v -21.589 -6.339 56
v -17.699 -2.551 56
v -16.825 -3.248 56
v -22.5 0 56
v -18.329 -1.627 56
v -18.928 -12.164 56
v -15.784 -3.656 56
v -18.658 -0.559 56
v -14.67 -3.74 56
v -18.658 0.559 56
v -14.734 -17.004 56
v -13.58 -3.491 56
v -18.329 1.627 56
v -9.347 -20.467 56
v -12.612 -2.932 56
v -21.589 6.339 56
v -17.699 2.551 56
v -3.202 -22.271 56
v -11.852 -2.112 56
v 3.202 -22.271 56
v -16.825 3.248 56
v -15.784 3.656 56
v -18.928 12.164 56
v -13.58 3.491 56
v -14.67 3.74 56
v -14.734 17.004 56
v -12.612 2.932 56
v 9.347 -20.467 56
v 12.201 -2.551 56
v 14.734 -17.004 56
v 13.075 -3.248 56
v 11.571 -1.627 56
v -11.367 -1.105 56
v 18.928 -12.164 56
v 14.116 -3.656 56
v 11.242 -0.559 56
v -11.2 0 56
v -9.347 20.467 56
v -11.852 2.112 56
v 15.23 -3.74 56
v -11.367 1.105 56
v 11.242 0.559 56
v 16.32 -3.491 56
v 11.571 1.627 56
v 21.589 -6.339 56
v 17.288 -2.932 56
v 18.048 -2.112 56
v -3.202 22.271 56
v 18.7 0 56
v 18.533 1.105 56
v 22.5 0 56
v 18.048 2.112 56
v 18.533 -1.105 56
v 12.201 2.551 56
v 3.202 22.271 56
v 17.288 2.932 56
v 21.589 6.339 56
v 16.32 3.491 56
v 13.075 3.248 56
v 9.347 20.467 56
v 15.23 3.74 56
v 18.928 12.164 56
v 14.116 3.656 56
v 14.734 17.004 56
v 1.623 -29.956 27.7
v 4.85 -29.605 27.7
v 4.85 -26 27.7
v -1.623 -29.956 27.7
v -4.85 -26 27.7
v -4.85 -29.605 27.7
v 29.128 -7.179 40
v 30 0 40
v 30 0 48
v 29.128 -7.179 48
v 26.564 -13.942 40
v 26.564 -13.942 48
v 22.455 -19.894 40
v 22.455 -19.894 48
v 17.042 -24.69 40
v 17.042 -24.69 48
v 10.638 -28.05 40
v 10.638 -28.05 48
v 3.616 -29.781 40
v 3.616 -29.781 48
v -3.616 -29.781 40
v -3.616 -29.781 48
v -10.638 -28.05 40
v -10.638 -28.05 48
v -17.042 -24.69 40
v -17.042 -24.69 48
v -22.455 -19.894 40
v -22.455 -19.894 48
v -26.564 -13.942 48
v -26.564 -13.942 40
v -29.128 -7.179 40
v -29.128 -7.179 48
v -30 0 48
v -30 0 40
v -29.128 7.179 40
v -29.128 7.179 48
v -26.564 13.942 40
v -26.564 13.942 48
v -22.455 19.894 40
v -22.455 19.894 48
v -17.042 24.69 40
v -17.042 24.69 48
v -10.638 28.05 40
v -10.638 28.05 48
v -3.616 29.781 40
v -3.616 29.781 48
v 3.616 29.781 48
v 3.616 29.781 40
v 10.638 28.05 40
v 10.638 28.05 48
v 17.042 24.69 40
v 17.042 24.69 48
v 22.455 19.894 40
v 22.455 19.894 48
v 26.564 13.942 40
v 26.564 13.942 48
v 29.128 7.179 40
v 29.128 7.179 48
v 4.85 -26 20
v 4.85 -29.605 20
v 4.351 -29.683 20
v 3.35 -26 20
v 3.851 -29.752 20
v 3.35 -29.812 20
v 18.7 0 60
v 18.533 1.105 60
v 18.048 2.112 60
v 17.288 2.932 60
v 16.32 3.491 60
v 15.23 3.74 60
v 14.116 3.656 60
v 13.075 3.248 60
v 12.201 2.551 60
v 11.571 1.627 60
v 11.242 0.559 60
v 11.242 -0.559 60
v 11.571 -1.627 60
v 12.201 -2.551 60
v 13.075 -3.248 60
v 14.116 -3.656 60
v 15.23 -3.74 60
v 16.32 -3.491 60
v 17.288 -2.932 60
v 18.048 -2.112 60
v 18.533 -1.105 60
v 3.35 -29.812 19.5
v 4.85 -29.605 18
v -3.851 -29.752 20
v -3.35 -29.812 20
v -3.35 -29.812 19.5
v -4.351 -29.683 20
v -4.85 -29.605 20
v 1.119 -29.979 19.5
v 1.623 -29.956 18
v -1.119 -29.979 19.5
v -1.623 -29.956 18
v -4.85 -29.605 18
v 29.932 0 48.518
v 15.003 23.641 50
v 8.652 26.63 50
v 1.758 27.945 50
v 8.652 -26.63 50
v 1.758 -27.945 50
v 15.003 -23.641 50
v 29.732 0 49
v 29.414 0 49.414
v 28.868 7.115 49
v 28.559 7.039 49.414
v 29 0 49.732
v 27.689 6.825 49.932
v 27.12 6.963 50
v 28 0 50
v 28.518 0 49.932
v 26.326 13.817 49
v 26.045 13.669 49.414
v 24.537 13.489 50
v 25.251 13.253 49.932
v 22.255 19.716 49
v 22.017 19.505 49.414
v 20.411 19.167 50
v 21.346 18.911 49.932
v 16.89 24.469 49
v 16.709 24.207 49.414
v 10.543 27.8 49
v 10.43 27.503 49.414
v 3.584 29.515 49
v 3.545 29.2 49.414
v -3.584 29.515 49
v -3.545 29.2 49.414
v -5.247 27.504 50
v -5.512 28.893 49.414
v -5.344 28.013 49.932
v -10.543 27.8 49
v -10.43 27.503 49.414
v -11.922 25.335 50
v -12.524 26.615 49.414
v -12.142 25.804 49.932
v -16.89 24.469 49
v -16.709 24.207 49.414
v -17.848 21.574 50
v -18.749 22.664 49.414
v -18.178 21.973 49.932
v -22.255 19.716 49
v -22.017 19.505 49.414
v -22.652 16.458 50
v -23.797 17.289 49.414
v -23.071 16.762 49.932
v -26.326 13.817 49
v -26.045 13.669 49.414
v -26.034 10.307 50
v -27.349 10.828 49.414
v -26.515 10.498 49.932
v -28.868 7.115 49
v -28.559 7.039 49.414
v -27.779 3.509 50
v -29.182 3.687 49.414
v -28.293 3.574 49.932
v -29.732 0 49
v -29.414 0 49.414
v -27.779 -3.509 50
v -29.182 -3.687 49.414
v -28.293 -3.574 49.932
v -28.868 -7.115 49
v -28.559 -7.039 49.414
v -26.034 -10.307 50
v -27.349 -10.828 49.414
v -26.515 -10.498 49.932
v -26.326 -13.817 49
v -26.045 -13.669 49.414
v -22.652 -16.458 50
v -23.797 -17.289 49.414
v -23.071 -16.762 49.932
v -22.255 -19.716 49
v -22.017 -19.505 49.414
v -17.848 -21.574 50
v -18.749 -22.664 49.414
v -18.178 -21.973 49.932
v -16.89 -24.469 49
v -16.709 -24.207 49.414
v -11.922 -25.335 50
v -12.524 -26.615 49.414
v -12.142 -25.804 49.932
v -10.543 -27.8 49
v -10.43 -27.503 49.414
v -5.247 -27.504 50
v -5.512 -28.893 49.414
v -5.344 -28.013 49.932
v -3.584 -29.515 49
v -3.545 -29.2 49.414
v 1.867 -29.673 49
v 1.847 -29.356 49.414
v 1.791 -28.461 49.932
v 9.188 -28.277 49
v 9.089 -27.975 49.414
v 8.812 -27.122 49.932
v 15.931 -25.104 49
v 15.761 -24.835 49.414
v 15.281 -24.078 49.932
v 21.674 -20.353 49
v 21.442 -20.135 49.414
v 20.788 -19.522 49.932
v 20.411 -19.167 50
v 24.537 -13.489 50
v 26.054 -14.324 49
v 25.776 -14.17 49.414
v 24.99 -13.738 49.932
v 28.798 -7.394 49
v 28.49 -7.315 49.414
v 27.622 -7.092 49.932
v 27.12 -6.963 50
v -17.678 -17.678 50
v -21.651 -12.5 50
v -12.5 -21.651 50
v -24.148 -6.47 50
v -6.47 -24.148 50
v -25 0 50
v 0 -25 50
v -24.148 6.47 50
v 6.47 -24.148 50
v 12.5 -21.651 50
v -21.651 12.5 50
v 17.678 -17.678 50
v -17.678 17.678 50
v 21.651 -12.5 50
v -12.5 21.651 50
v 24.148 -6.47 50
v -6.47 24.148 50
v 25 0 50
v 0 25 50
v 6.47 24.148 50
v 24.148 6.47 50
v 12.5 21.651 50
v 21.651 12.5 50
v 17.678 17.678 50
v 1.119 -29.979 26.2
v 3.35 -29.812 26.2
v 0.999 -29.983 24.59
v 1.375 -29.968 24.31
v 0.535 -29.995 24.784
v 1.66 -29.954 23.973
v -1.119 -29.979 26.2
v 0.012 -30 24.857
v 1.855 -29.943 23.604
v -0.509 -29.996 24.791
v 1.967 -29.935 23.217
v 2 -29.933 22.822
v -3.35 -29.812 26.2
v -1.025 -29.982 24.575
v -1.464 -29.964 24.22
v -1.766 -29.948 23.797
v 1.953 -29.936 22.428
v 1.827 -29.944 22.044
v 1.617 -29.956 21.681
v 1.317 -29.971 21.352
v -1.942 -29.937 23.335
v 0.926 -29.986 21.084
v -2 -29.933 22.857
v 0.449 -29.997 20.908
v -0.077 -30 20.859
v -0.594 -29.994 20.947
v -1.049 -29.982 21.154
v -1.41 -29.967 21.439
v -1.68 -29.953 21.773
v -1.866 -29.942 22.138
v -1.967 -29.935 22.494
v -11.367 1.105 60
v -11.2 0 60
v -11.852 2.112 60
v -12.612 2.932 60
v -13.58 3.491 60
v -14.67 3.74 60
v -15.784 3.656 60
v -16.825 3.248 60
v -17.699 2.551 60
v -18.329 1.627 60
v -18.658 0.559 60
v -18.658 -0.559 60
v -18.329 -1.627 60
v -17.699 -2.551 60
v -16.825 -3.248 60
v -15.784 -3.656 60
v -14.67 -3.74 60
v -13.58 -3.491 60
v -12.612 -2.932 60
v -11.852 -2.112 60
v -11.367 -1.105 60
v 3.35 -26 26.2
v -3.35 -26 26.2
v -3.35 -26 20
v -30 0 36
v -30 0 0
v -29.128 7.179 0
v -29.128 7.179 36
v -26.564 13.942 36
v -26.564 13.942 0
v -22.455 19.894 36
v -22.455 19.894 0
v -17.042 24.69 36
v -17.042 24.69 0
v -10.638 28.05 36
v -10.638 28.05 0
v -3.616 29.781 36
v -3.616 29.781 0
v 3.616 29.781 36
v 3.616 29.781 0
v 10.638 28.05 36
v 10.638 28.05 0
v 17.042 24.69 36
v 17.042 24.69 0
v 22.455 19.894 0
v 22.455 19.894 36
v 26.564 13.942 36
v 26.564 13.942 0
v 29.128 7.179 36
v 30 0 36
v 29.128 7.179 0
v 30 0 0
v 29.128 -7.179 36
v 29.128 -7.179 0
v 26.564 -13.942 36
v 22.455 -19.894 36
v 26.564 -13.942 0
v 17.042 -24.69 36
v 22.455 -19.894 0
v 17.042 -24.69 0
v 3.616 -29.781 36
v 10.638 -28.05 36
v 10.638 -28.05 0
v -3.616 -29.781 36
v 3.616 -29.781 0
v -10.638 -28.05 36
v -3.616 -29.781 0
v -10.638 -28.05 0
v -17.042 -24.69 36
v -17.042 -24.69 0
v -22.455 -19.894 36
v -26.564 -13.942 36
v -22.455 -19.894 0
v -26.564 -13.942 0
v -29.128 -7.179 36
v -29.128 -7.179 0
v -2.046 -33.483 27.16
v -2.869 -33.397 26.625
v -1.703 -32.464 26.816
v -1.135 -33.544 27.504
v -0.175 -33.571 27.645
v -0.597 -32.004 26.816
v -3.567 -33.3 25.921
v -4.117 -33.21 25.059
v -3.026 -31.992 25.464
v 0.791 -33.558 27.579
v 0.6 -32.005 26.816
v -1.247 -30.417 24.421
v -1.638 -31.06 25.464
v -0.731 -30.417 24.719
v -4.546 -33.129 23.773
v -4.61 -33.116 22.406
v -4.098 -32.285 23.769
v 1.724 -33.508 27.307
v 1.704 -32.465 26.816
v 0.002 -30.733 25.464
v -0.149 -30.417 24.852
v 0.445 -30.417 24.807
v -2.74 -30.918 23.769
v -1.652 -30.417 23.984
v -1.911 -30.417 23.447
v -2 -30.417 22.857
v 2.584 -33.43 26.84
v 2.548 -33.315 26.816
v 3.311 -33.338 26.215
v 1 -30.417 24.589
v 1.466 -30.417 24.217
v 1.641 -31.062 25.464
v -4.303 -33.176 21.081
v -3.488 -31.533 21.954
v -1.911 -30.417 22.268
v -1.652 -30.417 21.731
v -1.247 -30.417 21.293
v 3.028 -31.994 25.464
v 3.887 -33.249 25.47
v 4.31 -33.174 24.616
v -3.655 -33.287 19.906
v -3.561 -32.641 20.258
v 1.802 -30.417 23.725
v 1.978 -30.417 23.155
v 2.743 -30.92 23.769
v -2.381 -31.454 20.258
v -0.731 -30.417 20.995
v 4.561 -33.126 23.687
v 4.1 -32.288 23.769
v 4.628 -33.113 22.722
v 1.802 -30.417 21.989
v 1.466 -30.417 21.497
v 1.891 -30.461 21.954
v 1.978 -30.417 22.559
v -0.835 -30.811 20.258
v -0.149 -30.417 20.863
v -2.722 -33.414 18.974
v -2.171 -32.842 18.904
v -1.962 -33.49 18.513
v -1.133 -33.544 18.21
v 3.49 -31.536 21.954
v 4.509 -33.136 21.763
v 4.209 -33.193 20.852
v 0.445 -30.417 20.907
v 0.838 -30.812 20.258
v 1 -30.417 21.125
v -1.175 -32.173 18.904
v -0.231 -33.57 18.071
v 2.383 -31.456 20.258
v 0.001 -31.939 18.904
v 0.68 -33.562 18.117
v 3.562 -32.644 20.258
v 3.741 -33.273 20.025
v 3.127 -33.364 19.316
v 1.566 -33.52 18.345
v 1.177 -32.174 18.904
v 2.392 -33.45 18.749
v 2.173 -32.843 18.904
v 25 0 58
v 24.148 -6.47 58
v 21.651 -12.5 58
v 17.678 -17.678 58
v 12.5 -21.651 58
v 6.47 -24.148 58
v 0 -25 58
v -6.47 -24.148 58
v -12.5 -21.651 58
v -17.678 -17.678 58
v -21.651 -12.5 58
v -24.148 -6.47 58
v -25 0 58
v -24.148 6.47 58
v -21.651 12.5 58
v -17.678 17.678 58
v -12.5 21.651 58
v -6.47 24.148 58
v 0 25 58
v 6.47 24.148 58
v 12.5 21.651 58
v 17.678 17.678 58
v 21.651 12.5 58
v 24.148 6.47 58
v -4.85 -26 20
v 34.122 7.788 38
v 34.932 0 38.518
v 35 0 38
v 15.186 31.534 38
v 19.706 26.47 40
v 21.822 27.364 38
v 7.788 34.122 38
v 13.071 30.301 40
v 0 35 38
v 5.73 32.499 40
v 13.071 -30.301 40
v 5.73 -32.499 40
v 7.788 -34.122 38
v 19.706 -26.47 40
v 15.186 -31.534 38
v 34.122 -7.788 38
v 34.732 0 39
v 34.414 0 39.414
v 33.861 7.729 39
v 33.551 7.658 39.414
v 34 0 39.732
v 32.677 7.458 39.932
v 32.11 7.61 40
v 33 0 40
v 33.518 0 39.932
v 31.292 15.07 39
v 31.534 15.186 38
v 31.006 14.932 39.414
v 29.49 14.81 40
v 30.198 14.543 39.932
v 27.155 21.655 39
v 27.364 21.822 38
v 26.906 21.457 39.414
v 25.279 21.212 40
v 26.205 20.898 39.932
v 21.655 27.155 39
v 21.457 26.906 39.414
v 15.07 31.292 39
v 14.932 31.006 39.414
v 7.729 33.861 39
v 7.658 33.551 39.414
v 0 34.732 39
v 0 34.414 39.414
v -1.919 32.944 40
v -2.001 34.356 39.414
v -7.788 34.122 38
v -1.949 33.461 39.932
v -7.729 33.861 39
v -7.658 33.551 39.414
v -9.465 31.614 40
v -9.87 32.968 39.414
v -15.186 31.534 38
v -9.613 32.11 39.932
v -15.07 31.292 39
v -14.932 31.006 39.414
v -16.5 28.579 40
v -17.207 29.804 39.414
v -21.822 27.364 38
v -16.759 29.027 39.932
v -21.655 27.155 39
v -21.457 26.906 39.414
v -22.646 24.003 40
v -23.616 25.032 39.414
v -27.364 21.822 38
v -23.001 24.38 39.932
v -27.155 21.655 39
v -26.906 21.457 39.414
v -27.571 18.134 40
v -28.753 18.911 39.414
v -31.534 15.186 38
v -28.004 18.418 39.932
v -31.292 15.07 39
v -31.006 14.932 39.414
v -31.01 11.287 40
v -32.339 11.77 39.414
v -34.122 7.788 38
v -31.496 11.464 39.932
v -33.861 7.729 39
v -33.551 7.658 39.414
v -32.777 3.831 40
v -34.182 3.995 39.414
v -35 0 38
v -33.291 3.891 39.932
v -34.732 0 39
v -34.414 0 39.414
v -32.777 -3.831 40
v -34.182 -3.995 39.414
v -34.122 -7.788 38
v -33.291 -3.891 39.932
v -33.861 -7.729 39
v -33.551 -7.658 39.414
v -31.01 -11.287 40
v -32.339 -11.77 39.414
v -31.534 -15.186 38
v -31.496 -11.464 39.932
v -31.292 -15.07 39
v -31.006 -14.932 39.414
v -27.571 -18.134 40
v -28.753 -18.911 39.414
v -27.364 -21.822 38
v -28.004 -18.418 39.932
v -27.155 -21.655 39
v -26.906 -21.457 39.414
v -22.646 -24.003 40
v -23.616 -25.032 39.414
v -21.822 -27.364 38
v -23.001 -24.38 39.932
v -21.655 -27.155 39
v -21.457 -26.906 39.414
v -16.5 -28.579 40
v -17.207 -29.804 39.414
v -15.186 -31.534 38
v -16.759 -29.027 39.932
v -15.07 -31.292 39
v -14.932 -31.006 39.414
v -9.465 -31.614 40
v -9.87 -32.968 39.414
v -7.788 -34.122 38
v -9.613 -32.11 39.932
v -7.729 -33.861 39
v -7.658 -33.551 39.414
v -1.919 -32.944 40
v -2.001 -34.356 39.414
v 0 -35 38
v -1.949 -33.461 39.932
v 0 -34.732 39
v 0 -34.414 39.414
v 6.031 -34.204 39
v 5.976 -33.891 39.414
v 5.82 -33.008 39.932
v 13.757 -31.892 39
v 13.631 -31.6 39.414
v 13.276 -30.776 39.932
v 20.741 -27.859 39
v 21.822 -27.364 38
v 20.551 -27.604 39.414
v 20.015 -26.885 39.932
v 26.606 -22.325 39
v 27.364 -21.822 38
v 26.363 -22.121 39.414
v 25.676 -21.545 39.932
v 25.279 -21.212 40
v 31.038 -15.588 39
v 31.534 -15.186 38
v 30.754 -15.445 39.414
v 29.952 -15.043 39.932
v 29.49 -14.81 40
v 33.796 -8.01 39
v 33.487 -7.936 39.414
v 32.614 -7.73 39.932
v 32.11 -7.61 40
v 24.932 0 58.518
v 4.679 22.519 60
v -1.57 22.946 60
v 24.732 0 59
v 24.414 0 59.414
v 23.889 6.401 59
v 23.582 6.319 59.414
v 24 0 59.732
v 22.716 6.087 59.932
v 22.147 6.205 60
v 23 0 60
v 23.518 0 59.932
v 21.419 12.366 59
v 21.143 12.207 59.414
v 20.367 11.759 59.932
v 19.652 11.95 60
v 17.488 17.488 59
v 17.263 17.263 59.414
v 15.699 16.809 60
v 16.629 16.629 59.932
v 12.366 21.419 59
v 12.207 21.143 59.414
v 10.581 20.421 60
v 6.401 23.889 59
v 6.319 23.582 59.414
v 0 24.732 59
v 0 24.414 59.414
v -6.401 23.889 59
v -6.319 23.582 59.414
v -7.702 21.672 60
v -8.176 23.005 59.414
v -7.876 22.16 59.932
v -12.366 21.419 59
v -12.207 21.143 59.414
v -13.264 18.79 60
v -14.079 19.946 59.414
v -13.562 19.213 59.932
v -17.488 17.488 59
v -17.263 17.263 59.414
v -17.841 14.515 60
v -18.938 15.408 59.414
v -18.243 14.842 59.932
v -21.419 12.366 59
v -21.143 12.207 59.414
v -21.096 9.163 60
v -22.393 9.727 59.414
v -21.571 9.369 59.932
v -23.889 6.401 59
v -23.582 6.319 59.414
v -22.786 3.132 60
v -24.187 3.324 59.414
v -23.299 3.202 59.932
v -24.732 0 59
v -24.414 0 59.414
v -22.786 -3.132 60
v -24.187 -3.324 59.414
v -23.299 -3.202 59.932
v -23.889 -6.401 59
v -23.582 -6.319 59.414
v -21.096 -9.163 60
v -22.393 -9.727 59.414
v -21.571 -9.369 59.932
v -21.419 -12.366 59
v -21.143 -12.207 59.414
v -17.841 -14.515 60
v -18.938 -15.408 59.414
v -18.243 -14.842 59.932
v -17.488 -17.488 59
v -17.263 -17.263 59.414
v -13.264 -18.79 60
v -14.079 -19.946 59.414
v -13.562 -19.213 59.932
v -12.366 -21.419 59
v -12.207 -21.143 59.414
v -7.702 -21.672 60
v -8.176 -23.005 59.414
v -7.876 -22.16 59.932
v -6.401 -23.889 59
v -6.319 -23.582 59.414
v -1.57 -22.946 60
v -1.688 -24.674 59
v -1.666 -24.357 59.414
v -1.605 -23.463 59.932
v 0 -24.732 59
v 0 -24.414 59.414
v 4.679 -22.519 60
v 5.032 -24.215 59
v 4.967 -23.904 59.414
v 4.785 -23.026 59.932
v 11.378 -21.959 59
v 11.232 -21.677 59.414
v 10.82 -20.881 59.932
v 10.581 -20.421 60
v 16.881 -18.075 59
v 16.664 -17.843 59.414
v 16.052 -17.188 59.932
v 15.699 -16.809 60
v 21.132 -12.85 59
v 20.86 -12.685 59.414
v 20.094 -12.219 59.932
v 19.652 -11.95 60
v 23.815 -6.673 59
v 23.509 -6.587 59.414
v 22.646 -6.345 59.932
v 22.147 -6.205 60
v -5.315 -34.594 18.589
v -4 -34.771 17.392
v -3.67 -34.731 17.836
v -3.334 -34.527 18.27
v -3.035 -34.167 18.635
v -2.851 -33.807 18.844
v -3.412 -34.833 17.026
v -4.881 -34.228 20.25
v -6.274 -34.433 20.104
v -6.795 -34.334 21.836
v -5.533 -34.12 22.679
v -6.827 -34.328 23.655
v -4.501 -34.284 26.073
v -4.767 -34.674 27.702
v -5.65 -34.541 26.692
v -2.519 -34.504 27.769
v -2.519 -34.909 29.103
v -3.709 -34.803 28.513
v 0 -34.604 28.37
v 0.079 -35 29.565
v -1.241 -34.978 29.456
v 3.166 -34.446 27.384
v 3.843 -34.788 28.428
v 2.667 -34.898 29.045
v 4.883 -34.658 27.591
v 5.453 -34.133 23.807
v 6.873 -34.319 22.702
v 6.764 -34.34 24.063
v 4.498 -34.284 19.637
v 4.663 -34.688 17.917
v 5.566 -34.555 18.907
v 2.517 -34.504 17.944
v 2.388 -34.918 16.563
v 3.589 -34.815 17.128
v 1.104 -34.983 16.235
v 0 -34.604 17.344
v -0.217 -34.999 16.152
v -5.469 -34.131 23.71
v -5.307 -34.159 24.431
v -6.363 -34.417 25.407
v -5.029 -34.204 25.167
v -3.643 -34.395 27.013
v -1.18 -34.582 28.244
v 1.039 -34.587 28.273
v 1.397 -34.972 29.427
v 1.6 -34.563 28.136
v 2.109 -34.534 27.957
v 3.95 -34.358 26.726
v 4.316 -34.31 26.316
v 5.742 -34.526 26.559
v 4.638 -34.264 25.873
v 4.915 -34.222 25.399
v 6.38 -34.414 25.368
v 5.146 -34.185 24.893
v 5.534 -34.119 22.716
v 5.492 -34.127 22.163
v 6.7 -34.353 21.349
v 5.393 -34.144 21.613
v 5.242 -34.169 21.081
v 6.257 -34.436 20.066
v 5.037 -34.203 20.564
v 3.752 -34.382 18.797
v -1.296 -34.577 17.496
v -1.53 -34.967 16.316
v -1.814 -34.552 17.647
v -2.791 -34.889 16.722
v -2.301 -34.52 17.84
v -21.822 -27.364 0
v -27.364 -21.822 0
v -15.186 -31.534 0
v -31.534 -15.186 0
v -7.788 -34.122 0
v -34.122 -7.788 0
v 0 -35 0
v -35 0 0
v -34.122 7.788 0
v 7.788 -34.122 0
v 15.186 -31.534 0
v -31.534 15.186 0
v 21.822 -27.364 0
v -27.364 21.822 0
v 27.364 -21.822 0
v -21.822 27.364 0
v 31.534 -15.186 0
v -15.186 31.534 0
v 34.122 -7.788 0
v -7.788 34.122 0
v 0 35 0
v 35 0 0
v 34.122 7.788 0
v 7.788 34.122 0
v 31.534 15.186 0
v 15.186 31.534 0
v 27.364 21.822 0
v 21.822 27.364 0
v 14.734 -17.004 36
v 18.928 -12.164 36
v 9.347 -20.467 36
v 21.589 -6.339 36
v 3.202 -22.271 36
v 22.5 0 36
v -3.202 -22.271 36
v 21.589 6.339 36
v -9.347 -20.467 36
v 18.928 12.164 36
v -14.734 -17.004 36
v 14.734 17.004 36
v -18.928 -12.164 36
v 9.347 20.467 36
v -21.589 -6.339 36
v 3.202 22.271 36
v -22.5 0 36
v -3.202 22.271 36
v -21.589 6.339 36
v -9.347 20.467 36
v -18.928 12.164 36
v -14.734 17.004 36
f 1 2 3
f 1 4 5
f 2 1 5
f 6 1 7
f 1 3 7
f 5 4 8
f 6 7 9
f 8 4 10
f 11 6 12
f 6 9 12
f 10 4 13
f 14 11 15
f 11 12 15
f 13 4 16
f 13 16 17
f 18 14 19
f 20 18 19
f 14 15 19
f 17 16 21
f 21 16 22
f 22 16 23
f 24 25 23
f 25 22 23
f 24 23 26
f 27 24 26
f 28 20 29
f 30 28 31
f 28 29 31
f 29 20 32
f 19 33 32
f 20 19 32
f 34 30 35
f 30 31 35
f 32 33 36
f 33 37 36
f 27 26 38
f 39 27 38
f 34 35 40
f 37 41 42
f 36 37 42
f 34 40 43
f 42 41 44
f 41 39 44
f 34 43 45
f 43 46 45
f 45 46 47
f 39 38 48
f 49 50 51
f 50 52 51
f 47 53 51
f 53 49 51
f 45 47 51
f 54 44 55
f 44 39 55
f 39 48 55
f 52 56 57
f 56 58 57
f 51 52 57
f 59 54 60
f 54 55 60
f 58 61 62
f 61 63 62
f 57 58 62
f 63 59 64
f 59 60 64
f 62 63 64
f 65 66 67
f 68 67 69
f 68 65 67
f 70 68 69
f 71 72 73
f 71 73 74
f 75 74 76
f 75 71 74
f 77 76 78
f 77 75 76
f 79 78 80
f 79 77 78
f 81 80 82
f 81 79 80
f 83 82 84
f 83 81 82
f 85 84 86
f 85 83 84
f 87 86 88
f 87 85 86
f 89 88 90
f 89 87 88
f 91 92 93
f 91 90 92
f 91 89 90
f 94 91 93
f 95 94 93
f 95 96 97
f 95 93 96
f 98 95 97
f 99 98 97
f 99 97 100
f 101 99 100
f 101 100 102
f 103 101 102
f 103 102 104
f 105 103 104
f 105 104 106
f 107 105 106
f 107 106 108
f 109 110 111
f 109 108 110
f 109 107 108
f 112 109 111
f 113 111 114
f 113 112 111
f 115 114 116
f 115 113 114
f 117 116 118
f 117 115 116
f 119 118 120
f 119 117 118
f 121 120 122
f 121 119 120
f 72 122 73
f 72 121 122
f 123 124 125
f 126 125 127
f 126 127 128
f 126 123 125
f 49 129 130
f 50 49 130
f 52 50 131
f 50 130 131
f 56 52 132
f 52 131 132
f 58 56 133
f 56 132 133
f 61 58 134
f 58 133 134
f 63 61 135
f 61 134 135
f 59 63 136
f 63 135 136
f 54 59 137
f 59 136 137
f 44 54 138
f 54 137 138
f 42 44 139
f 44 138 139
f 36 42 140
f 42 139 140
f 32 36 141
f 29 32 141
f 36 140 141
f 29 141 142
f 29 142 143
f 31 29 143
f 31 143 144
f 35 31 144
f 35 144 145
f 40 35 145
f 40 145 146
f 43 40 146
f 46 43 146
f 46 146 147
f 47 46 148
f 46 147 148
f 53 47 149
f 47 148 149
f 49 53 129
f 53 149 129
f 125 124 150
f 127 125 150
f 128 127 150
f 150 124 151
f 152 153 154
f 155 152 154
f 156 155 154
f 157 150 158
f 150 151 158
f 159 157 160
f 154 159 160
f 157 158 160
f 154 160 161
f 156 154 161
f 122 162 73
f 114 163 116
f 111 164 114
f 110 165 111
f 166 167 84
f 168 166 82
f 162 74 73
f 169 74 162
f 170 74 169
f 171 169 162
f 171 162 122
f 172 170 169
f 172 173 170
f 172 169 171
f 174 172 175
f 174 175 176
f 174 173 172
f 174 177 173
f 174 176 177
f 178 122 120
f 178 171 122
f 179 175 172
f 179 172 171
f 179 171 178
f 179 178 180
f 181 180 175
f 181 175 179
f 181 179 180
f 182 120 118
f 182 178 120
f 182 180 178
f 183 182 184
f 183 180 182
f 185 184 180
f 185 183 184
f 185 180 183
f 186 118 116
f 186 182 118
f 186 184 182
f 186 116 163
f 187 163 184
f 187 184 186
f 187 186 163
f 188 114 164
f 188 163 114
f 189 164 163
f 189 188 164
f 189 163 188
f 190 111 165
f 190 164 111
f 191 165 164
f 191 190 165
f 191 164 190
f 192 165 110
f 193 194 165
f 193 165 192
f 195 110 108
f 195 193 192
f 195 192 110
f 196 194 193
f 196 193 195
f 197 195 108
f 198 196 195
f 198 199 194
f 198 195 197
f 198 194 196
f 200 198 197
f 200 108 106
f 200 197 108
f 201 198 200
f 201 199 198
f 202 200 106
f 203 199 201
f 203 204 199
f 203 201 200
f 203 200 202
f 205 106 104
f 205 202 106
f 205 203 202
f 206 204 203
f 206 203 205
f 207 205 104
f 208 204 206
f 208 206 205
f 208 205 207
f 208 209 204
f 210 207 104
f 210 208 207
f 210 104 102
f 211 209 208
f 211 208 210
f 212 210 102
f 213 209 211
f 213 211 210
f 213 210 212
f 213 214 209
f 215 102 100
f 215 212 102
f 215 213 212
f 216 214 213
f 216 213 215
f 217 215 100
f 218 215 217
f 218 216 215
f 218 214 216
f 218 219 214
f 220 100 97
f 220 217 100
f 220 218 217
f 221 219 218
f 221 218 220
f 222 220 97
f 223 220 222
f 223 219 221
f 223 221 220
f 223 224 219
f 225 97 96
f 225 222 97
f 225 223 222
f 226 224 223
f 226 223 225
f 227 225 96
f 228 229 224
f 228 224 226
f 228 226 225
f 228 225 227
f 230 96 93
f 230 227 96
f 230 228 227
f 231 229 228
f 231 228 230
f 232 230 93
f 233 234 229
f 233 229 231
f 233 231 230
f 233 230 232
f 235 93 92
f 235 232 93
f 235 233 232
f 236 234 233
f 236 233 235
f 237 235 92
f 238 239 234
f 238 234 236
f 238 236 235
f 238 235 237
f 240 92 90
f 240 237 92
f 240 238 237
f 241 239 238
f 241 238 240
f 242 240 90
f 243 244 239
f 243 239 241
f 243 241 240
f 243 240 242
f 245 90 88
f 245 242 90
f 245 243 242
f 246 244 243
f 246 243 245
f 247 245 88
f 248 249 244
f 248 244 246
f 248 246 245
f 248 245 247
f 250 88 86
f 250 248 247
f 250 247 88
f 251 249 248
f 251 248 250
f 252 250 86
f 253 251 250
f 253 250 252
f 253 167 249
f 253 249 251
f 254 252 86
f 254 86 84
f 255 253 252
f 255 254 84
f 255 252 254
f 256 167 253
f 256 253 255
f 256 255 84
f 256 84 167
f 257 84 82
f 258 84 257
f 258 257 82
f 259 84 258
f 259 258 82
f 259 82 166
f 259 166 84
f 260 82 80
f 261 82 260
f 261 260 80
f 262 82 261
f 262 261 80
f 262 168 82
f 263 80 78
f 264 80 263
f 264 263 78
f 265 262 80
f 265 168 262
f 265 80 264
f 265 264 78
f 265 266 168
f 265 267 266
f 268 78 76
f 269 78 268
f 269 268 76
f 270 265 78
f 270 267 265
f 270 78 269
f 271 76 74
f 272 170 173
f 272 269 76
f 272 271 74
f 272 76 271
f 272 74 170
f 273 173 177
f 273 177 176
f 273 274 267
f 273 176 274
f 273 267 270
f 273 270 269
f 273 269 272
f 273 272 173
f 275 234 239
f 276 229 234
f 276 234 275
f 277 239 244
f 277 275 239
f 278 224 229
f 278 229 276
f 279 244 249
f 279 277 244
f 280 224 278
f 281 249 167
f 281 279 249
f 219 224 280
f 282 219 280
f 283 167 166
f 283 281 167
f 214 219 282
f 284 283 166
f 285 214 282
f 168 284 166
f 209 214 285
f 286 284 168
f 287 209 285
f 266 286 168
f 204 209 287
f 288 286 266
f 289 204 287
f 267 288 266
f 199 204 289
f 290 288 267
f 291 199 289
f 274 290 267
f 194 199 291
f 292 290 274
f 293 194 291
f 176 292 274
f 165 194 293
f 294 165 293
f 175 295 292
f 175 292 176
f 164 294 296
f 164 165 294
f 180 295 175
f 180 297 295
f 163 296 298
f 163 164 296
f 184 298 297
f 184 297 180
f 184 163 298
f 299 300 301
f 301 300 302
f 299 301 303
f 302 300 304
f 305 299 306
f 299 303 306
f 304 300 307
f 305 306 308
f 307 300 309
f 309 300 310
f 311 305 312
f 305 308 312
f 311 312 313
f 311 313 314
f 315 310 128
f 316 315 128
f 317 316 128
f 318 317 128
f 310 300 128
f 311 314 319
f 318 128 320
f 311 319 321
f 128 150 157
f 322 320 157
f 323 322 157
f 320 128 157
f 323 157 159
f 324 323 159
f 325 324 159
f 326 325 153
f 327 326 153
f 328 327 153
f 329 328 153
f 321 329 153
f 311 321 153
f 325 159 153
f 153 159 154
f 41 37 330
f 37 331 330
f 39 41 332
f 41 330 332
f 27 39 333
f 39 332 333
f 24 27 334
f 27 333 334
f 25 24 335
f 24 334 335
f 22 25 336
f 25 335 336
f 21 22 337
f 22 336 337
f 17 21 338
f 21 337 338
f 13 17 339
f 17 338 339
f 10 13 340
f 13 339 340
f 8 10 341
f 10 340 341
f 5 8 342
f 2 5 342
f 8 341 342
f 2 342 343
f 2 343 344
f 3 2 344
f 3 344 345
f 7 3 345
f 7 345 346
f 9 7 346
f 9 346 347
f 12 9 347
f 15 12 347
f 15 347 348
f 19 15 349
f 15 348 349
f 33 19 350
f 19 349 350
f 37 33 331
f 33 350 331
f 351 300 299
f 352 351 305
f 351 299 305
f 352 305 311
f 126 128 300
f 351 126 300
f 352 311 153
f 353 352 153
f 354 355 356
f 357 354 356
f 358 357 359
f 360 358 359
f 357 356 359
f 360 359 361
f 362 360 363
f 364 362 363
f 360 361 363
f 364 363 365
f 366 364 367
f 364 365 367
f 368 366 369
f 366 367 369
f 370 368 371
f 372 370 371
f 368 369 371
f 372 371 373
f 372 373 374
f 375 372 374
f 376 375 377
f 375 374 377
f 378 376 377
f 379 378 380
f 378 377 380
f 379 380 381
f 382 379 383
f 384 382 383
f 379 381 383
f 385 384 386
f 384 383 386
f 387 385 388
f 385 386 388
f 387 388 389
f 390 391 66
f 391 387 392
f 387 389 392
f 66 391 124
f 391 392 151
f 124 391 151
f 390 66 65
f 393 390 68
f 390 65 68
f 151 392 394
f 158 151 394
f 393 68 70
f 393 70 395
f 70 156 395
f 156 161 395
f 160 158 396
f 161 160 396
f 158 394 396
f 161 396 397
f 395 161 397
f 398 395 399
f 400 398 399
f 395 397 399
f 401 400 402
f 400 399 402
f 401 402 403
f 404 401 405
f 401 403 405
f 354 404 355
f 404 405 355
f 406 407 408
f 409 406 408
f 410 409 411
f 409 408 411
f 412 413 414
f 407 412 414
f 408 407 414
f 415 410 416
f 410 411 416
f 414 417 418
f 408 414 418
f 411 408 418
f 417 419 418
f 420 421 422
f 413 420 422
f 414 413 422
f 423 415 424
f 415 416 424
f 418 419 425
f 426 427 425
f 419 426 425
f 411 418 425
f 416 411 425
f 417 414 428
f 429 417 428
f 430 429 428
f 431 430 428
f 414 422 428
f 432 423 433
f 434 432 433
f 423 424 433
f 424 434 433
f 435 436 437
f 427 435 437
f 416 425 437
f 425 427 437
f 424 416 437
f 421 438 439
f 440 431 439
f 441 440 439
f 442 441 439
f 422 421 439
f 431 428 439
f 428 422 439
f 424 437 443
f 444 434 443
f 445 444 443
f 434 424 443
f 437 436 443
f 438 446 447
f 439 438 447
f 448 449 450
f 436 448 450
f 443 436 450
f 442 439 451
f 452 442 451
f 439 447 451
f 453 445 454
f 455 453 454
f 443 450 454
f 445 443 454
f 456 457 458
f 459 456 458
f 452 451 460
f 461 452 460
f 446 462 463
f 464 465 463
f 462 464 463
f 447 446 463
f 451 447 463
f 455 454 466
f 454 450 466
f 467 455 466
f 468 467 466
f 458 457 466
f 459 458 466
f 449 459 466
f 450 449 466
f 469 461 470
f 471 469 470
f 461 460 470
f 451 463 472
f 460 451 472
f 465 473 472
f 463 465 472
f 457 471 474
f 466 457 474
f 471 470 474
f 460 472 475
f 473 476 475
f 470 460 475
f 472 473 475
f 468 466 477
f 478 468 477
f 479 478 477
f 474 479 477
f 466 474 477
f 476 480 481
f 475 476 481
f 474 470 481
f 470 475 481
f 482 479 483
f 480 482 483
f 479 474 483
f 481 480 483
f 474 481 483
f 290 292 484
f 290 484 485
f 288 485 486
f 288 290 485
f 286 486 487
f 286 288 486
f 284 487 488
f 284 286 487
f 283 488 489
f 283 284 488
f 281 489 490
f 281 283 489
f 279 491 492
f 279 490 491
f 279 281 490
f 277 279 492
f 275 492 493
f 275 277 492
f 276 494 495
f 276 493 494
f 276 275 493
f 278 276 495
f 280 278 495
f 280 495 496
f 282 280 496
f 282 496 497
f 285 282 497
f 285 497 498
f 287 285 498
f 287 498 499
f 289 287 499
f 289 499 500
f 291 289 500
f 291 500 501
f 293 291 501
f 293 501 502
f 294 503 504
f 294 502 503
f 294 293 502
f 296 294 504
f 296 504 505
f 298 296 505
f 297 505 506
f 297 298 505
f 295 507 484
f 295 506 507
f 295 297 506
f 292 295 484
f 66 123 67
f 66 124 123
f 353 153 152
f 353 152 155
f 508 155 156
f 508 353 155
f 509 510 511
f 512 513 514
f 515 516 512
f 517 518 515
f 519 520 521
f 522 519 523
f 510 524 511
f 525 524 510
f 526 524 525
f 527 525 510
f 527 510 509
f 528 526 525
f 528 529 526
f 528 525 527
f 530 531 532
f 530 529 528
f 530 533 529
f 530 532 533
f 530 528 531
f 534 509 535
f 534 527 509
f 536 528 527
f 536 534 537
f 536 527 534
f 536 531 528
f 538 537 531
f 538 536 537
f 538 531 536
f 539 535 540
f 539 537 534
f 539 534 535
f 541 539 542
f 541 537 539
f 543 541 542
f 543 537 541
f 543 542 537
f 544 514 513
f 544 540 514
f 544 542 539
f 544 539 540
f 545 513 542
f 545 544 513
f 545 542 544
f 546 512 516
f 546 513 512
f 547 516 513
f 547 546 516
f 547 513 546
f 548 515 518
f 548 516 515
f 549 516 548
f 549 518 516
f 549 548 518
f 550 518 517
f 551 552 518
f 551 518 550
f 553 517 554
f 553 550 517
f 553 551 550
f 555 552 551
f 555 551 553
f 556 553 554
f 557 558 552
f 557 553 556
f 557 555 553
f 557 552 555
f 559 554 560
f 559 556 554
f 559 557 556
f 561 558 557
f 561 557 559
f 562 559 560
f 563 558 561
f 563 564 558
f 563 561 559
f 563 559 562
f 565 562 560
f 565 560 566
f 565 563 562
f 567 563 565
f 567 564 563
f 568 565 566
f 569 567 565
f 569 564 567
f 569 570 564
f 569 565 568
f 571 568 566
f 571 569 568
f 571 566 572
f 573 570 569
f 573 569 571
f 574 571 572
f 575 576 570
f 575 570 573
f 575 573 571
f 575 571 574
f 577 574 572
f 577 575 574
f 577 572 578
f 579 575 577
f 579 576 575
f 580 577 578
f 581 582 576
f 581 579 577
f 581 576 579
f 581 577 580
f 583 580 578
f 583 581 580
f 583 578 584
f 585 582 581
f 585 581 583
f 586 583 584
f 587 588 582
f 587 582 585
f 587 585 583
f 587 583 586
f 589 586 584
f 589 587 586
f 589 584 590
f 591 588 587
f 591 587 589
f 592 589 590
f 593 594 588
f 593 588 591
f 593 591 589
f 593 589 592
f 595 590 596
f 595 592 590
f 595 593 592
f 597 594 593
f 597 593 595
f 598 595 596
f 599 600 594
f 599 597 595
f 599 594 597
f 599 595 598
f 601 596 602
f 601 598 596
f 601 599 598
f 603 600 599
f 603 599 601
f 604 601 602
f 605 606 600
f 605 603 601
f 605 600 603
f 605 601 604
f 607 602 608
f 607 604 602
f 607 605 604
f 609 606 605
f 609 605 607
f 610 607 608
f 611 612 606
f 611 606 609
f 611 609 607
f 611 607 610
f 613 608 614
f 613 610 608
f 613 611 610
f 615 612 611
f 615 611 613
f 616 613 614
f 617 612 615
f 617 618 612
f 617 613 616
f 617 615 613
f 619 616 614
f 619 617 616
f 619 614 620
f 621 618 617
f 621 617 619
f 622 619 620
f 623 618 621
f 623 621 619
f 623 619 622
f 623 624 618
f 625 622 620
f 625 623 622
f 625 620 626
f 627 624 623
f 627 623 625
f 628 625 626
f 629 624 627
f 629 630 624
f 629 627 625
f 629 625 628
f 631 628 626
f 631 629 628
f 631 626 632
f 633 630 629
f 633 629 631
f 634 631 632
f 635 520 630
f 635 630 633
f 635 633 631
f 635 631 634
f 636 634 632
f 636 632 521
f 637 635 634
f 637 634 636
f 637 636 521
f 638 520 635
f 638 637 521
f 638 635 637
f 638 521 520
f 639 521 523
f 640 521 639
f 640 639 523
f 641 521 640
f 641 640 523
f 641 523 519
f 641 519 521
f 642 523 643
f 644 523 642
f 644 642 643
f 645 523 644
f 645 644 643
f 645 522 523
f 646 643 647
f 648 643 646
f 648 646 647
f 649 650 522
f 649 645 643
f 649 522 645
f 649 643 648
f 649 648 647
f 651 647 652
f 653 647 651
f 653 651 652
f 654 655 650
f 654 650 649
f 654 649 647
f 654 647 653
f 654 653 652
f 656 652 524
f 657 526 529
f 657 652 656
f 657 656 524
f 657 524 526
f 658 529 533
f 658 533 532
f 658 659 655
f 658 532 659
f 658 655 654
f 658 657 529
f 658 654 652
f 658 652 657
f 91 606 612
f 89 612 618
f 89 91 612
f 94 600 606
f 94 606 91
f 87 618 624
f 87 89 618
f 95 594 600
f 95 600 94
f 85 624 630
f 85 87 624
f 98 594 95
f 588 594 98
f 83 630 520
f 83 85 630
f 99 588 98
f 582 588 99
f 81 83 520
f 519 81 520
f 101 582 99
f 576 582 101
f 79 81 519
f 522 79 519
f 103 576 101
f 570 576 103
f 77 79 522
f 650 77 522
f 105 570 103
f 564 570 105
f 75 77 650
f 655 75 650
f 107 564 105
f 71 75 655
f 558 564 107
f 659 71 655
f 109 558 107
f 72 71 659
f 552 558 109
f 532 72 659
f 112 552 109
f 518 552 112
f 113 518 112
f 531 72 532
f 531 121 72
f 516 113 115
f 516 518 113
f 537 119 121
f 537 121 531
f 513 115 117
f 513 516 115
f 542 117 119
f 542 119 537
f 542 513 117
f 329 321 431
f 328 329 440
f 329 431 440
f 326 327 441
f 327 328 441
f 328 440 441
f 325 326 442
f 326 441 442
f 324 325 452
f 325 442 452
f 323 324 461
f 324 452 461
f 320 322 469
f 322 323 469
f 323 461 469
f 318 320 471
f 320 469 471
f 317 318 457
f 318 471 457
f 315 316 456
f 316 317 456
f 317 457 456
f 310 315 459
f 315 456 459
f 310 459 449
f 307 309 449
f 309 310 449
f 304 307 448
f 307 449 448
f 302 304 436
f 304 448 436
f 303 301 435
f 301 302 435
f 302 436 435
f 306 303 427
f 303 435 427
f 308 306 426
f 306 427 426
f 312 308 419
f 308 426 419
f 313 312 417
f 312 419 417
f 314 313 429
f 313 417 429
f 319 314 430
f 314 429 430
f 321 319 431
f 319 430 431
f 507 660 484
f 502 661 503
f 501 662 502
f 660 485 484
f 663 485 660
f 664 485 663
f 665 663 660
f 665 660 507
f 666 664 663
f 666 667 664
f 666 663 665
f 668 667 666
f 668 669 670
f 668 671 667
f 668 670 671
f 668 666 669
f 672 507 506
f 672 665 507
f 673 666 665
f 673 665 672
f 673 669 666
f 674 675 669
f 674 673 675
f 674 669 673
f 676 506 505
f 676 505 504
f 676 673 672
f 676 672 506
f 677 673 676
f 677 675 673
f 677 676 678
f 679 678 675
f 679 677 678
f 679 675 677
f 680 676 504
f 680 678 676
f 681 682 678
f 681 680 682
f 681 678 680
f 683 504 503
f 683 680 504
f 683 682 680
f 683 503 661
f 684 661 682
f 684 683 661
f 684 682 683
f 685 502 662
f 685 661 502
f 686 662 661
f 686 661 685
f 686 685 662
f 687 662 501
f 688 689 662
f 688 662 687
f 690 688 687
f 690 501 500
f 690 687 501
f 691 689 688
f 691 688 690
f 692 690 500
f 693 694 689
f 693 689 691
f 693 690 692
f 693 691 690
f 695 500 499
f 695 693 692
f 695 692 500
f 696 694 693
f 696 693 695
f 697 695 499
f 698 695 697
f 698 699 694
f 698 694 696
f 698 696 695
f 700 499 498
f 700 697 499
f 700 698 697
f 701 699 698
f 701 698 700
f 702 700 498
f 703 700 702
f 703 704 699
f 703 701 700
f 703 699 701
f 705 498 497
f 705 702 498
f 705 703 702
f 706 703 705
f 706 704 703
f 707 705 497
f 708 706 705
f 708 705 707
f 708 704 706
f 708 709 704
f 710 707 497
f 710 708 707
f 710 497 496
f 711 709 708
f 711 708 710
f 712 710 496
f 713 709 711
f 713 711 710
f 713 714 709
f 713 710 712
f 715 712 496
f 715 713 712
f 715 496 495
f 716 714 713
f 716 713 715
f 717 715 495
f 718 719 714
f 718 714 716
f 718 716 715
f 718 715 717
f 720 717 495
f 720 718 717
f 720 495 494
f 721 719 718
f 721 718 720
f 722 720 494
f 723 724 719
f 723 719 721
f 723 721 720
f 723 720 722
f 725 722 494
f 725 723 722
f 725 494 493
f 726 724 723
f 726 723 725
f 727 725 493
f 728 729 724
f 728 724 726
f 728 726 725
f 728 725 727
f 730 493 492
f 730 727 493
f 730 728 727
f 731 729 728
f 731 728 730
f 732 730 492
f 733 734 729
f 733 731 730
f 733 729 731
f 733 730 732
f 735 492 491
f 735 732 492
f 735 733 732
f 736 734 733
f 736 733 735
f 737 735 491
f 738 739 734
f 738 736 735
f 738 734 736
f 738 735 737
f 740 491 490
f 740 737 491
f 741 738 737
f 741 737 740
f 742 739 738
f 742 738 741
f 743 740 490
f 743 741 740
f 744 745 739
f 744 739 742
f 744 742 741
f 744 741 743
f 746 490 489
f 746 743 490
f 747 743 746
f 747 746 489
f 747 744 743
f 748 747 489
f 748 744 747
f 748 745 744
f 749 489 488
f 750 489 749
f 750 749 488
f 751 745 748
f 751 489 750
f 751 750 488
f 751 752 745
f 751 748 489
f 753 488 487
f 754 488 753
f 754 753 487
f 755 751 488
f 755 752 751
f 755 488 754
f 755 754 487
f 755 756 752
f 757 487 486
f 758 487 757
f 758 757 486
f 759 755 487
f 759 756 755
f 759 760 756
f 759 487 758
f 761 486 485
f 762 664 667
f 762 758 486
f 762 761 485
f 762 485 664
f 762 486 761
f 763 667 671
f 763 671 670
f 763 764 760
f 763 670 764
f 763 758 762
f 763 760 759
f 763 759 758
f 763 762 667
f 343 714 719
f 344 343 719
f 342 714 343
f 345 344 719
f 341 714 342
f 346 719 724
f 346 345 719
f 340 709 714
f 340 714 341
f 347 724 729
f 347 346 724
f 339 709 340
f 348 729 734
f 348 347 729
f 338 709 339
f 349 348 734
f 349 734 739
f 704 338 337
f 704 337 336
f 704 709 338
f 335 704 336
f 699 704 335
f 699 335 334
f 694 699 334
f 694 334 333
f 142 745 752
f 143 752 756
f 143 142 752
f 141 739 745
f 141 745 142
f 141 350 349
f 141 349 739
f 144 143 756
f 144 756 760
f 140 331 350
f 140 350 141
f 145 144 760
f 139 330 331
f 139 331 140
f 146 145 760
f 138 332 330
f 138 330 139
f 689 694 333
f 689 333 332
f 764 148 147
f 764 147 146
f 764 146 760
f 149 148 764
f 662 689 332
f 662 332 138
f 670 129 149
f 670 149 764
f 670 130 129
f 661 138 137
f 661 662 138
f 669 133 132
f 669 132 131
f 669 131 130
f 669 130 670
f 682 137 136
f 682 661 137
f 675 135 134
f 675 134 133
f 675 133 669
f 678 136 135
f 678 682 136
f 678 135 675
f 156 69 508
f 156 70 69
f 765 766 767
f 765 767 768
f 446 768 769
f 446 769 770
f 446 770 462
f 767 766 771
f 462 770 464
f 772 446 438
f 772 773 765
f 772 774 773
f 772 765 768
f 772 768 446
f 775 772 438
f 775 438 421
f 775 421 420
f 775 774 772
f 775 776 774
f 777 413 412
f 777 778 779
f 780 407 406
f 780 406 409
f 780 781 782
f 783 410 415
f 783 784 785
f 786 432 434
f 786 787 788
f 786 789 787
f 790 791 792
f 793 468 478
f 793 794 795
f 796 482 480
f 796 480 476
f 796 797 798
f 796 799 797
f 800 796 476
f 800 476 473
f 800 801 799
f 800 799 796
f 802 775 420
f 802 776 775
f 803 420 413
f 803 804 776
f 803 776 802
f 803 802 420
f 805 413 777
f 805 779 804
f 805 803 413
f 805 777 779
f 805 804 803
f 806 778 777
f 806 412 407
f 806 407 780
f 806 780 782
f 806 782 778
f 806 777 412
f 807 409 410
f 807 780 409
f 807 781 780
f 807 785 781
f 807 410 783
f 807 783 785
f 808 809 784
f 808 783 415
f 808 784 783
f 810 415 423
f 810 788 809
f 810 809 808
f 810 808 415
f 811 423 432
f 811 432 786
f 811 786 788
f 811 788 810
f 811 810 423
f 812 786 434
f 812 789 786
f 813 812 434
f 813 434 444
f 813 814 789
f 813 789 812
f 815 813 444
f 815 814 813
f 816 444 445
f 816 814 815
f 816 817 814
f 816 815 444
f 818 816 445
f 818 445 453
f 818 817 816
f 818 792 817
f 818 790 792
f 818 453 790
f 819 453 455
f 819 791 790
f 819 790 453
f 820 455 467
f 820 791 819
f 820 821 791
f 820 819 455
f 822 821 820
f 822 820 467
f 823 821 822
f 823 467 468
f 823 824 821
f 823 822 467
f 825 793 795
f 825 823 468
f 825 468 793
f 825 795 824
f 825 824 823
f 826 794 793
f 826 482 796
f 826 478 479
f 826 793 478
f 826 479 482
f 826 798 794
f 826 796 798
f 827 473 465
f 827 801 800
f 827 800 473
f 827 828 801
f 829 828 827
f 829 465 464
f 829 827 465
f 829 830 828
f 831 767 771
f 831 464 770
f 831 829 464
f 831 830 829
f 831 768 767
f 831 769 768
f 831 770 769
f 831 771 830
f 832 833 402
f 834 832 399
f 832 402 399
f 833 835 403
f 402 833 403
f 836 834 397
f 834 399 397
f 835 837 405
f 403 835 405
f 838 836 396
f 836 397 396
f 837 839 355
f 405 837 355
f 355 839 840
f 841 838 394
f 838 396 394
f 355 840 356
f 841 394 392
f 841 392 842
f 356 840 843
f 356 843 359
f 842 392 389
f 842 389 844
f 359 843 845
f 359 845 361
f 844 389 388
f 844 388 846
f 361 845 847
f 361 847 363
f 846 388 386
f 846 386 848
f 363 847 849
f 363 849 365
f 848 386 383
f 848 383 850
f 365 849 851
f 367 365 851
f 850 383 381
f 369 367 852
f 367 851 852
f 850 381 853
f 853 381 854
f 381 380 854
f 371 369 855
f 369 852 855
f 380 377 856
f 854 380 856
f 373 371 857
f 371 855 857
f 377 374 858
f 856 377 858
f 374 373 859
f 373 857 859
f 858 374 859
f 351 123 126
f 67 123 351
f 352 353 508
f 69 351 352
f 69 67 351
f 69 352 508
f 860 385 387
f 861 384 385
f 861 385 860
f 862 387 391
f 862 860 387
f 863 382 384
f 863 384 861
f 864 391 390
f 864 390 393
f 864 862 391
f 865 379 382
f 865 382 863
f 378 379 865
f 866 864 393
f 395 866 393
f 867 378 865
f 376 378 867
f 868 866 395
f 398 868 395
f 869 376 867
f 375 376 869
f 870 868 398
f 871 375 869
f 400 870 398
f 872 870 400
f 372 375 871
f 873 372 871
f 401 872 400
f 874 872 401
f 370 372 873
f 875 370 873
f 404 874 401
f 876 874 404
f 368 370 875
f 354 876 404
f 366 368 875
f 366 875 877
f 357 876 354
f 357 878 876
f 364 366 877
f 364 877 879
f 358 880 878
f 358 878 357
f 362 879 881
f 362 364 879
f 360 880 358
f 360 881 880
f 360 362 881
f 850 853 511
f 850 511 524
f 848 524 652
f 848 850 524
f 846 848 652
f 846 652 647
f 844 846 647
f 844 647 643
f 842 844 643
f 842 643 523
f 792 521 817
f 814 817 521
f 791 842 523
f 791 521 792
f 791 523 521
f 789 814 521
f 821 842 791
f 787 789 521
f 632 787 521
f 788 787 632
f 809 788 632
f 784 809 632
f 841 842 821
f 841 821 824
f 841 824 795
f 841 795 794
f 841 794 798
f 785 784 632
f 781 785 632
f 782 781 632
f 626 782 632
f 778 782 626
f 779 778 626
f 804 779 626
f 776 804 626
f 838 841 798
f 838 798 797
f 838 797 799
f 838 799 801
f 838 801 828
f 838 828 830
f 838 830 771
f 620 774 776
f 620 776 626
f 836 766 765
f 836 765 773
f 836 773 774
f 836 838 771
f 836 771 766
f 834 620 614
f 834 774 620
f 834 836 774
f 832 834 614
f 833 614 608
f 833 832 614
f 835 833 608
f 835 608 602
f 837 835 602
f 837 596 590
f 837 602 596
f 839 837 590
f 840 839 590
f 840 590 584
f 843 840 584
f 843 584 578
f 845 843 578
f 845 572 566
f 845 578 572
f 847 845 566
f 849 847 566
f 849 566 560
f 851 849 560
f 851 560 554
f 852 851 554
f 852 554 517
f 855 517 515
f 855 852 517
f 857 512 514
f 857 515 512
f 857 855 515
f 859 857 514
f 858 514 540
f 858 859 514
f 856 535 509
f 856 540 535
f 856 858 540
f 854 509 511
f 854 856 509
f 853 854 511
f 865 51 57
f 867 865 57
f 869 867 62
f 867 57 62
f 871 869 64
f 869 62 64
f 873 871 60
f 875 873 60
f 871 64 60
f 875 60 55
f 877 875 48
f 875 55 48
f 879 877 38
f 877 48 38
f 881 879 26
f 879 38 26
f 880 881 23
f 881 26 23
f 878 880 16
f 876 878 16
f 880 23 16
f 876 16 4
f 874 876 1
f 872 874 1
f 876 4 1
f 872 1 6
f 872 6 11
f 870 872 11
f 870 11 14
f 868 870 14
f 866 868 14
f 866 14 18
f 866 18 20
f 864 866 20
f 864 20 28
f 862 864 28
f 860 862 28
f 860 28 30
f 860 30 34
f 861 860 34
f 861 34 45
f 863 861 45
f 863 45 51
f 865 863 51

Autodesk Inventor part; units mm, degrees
sketch "Sketch1" plane through (0, 0, 0) normal (0, 0, 1) x (1, 0, 0)
  point P0 (0, 0)
sketch "Sketch2" plane through (0, 0, 0) normal (0, 0, 1) x (1, 0, 0)
  circle A0 centre (0, 0) radius 35
  dimension "d0" = 70
ref_plane "Work Plane1" through (0, 0, 30) normal (0, 0, 1) x (1, 0, 0)
sketch "Sketch3" plane through (0, 0, 30) normal (0, 0, 1) x (1, 0, 0)
  circle A0 centre (0, 0) radius 30
  dimension "d3" = 60
ref_plane "Work Plane2" through (0, 0, 35) normal (0, 0, 1) x (1, 0, 0)
sketch "Sketch4" plane through (0, 0, 35) normal (0, 0, 1) x (1, 0, 0)
  circle A0 centre (0, 0) radius 25
  dimension "d7" = 50
extrude "Extrusion1" add sketch "Sketch2" along normal blind 40
fillet "Fillet2" radius 2 1 edges at (-35, 0, 40)
ref_plane "Work Plane3" through (0, 0, 40) normal (0, 0, 1) x (1, 0, 0)
sketch "Sketch9" plane through (0, 0, 40) normal (0, 0, 1) x (1, 0, 0)
  circle A0 centre (0, 0) radius 33 projected
  circle A1 centre (0, 0) radius 30
  dimension "d42" = 60
extrude "Extrusion8" add sketch "Sketch9" along normal blind 10 contours A1
sketch "Sketch10" plane through (0, 0, 50) normal (0, 0, 1) x (1, 0, 0)
  circle A0 centre (0, 0) radius 30 projected
  circle A1 centre (0, 0) radius 25
  dimension "d45" = 50
extrude "Extrusion9" add sketch "Sketch10" along normal blind 10 contours A1
sketch "Sketch11" plane through (0, 0, 60) normal (0, 0, 1) x (1, 0, 0)
  circle A0 centre (0, 0) radius 25 projected
  circle A1 centre (0, 0) radius 22.5
  dimension "d48" = 45
extrude "Extrusion10" cut sketch "Sketch11" against normal blind 60 contours A1
sketch "Sketch14" plane through (0, 0, 0) normal (0, 0, -1) x (-1, 0, 0)
  circle A0 centre (0, 0) radius 22.5 projected
  circle A1 centre (0, 0) radius 35 projected
  circle A2 centre (0, 0) radius 30
  dimension "d58" = 60
extrude "Extrusion12" cut sketch "Sketch14" against normal blind 36 contours A2
sketch "Sketch15" plane through (0, 0, 36) normal (0, 0, -1) x (-1, 0, 0)
  circle A0 centre (0, 0) radius 22.5 projected
  circle A1 centre (0, 0) radius 30 projected
ref_plane "Work Plane4" through (0, 0, 60) normal (0, 0, 1) x (1, 0, 0)
sketch "Sketch18" plane through (0, 0, 60) normal (0, 0, 1) x (1, 0, 0)
  circle A0 centre (-14.95, 0) radius 3.75
  line L0 (-49, 0) -> (49, 0) projected
  line L1 (0, -49) -> (0, 49) projected
  circle A1 centre (14.95, 0) radius 3.75
  circle A2 centre (0, 0) radius 22.5
  point P0 (22.5, 0)
  point P1 (-11.2, 0)
  point P2 (10.775, 0)
  dimension "d71" = 7.5
  dimension "d78" = 14.95
  dimension "d81" = 45
extrude "Extrusion16" add sketch "Sketch18" against normal blind 4 contours L0 L1 A2 A0 | A0 L0 A2 L1 | L1 A2 L0 A1 | L0 A1 A2 L1
fillet "Fillet5" radius 2 2 edges at (-30, 0, 50) (-25, 0, 60)
ref_plane "Work Plane5" through (0, -35, 0) normal (0, 1, 0) x (-1, 0, 0)
sketch "Sketch19" plane through (0, -35, 0) normal (0, 1, 0) x (-1, 0, 0)
  line L0 (49, 0) -> (-49, 0)
  line L1 (0, -12) -> (0, 72)
  arc A0 (0, 27.857143) -> (0, 17.857143) centre (0, 22.857143) ccw
  line L2 (0, 27.857143) -> (0, 17.857143)
  point P0 (0, 0)
  dimension "d86" = 10
revolve "Revolution1" cut sketch "Sketch19" angle 360 about axis through (0, -35, -10) along (0, 0, 1)
ref_plane "Work Plane6" through (0, -35, 0) normal (0, 1, 0) x (-1, 0, 0)
sketch "Sketch20" plane through (0, -35, 0) normal (0, 1, 0) x (-1, 0, 0)
  line L0 (0, -12) -> (0, 72)
  line L1 (49, 0) -> (-49, 0)
  line L2 (0, 27.857143) -> (0, 17.857143)
  circle A0 centre (0, 22.857143) radius 2
  point P0 (0, 0)
  dimension "d90" = 4
extrude "Extrusion17" cut sketch "Sketch20" along normal blind 10
ref_plane "Work Plane7" through (0, -29, 0) normal (0, 1, 0) x (-1, 0, 0)
sketch "Sketch21" plane through (0, -29, 0) normal (0, 1, 0) x (-1, 0, 0)
  line L0 (-4.85, 27.7) -> (4.85, 27.7)
  line L1 (4.85, 27.7) -> (4.85, 18)
  line L2 (4.85, 18) -> (-4.85, 18)
  line L3 (-4.85, 18) -> (-4.85, 27.7)
  line L4 (-3.35, 26.2) -> (3.35, 26.2)
  line L5 (3.35, 26.2) -> (3.35, 19.5)
  line L6 (3.35, 19.5) -> (-3.35, 19.5)
  line L7 (-3.35, 19.5) -> (-3.35, 26.2)
  line L8 (-35, 0) -> (35, 0) projected
  line L9 (-49, 0) -> (49, 0) projected
  line L10 (49, 0) -> (-49, 0) projected
  line L11 (0, -12) -> (0, 72) projected
  point P0 (0, 0)
  dimension "d99" = 18
  dimension "d101" = 6.7
  dimension "d102" = 1.5
  dimension "d103" = 1.5
  dimension "d104" = 1.5
  dimension "d105" = 6.7
extrude "Extrusion18" add sketch "Sketch21" along normal blind 3 and the other way blind 2 contours L0 L11 L4 L7 L6 L2 L3 | L0 L1 L2 L11 L6 L5 L4
fillet "Fillet6" radius 2 2 edges at (-4.9872, -34.6429, 22.8521) (4.9872, -34.6429, 22.8557)
sketch "Sketch22" plane through (0, 0, 18) normal (0, 0, -1) x (-1, 0, 0)
  arc A0 (-4.85, -29.605363) -> (4.85, -29.605363) centre (0, 0) ccw
  line L0 (-4.85, -26) -> (-4.85, -29.605363)
  line L1 (-4.85, -26) -> (4.85, -26)
  line L2 (4.85, -26) -> (4.85, -29.605363)
  line L3 (-4.85, -29.605363) -> (-4.85, -26)
  arc A1 (-4.85, -29.605363) -> (4.85, -29.605363) centre (0, -1.266986) ccw
sketch "Sketch22 outline for Extrusion19" plane through (0, 0, 18) normal (0, 0, -1) x (-1, 0, 0)
  line L0 (-4.85, -26) -> (-4.85, -29.605363)
  line L1 (4.85, -26) -> (-4.85, -26)
  line L2 (4.85, -29.605363) -> (4.85, -26)
  arc A0 (-4.85, -29.605363) -> (4.85, -29.605363) centre (0, 0) ccw
extrude "Extrusion19" cut sketch "Sketch22 outline for Extrusion19" against normal blind 2
sketch "Sketch23" plane through (0, -26, 0) normal (0, 1, 0) x (1, 0, 0)
  line L0 (4.85, -20) -> (3.35, -20)
  line L1 (3.35, -20) -> (3.35, -26.2)
  line L2 (3.35, -26.2) -> (-3.35, -26.2)
  line L3 (-3.35, -26.2) -> (-3.35, -20)
  line L4 (-3.35, -20) -> (-4.85, -20)
  line L5 (-4.85, -20) -> (-4.85, -27.7)
  line L6 (-4.85, -27.7) -> (4.85, -27.7)
  line L7 (4.85, -27.7) -> (4.85, -20)
  line L8 (-3.35, -21.72852) -> (3.35, -21.72852)
  line L9 (3.35, -21.72852) -> (3.35, -26.2)
  line L10 (3.35, -26.2) -> (-3.35, -26.2)
  line L11 (-3.35, -26.2) -> (-3.35, -21.72852)
  point P0 (0, 0)
properties part number "Carcasa"
